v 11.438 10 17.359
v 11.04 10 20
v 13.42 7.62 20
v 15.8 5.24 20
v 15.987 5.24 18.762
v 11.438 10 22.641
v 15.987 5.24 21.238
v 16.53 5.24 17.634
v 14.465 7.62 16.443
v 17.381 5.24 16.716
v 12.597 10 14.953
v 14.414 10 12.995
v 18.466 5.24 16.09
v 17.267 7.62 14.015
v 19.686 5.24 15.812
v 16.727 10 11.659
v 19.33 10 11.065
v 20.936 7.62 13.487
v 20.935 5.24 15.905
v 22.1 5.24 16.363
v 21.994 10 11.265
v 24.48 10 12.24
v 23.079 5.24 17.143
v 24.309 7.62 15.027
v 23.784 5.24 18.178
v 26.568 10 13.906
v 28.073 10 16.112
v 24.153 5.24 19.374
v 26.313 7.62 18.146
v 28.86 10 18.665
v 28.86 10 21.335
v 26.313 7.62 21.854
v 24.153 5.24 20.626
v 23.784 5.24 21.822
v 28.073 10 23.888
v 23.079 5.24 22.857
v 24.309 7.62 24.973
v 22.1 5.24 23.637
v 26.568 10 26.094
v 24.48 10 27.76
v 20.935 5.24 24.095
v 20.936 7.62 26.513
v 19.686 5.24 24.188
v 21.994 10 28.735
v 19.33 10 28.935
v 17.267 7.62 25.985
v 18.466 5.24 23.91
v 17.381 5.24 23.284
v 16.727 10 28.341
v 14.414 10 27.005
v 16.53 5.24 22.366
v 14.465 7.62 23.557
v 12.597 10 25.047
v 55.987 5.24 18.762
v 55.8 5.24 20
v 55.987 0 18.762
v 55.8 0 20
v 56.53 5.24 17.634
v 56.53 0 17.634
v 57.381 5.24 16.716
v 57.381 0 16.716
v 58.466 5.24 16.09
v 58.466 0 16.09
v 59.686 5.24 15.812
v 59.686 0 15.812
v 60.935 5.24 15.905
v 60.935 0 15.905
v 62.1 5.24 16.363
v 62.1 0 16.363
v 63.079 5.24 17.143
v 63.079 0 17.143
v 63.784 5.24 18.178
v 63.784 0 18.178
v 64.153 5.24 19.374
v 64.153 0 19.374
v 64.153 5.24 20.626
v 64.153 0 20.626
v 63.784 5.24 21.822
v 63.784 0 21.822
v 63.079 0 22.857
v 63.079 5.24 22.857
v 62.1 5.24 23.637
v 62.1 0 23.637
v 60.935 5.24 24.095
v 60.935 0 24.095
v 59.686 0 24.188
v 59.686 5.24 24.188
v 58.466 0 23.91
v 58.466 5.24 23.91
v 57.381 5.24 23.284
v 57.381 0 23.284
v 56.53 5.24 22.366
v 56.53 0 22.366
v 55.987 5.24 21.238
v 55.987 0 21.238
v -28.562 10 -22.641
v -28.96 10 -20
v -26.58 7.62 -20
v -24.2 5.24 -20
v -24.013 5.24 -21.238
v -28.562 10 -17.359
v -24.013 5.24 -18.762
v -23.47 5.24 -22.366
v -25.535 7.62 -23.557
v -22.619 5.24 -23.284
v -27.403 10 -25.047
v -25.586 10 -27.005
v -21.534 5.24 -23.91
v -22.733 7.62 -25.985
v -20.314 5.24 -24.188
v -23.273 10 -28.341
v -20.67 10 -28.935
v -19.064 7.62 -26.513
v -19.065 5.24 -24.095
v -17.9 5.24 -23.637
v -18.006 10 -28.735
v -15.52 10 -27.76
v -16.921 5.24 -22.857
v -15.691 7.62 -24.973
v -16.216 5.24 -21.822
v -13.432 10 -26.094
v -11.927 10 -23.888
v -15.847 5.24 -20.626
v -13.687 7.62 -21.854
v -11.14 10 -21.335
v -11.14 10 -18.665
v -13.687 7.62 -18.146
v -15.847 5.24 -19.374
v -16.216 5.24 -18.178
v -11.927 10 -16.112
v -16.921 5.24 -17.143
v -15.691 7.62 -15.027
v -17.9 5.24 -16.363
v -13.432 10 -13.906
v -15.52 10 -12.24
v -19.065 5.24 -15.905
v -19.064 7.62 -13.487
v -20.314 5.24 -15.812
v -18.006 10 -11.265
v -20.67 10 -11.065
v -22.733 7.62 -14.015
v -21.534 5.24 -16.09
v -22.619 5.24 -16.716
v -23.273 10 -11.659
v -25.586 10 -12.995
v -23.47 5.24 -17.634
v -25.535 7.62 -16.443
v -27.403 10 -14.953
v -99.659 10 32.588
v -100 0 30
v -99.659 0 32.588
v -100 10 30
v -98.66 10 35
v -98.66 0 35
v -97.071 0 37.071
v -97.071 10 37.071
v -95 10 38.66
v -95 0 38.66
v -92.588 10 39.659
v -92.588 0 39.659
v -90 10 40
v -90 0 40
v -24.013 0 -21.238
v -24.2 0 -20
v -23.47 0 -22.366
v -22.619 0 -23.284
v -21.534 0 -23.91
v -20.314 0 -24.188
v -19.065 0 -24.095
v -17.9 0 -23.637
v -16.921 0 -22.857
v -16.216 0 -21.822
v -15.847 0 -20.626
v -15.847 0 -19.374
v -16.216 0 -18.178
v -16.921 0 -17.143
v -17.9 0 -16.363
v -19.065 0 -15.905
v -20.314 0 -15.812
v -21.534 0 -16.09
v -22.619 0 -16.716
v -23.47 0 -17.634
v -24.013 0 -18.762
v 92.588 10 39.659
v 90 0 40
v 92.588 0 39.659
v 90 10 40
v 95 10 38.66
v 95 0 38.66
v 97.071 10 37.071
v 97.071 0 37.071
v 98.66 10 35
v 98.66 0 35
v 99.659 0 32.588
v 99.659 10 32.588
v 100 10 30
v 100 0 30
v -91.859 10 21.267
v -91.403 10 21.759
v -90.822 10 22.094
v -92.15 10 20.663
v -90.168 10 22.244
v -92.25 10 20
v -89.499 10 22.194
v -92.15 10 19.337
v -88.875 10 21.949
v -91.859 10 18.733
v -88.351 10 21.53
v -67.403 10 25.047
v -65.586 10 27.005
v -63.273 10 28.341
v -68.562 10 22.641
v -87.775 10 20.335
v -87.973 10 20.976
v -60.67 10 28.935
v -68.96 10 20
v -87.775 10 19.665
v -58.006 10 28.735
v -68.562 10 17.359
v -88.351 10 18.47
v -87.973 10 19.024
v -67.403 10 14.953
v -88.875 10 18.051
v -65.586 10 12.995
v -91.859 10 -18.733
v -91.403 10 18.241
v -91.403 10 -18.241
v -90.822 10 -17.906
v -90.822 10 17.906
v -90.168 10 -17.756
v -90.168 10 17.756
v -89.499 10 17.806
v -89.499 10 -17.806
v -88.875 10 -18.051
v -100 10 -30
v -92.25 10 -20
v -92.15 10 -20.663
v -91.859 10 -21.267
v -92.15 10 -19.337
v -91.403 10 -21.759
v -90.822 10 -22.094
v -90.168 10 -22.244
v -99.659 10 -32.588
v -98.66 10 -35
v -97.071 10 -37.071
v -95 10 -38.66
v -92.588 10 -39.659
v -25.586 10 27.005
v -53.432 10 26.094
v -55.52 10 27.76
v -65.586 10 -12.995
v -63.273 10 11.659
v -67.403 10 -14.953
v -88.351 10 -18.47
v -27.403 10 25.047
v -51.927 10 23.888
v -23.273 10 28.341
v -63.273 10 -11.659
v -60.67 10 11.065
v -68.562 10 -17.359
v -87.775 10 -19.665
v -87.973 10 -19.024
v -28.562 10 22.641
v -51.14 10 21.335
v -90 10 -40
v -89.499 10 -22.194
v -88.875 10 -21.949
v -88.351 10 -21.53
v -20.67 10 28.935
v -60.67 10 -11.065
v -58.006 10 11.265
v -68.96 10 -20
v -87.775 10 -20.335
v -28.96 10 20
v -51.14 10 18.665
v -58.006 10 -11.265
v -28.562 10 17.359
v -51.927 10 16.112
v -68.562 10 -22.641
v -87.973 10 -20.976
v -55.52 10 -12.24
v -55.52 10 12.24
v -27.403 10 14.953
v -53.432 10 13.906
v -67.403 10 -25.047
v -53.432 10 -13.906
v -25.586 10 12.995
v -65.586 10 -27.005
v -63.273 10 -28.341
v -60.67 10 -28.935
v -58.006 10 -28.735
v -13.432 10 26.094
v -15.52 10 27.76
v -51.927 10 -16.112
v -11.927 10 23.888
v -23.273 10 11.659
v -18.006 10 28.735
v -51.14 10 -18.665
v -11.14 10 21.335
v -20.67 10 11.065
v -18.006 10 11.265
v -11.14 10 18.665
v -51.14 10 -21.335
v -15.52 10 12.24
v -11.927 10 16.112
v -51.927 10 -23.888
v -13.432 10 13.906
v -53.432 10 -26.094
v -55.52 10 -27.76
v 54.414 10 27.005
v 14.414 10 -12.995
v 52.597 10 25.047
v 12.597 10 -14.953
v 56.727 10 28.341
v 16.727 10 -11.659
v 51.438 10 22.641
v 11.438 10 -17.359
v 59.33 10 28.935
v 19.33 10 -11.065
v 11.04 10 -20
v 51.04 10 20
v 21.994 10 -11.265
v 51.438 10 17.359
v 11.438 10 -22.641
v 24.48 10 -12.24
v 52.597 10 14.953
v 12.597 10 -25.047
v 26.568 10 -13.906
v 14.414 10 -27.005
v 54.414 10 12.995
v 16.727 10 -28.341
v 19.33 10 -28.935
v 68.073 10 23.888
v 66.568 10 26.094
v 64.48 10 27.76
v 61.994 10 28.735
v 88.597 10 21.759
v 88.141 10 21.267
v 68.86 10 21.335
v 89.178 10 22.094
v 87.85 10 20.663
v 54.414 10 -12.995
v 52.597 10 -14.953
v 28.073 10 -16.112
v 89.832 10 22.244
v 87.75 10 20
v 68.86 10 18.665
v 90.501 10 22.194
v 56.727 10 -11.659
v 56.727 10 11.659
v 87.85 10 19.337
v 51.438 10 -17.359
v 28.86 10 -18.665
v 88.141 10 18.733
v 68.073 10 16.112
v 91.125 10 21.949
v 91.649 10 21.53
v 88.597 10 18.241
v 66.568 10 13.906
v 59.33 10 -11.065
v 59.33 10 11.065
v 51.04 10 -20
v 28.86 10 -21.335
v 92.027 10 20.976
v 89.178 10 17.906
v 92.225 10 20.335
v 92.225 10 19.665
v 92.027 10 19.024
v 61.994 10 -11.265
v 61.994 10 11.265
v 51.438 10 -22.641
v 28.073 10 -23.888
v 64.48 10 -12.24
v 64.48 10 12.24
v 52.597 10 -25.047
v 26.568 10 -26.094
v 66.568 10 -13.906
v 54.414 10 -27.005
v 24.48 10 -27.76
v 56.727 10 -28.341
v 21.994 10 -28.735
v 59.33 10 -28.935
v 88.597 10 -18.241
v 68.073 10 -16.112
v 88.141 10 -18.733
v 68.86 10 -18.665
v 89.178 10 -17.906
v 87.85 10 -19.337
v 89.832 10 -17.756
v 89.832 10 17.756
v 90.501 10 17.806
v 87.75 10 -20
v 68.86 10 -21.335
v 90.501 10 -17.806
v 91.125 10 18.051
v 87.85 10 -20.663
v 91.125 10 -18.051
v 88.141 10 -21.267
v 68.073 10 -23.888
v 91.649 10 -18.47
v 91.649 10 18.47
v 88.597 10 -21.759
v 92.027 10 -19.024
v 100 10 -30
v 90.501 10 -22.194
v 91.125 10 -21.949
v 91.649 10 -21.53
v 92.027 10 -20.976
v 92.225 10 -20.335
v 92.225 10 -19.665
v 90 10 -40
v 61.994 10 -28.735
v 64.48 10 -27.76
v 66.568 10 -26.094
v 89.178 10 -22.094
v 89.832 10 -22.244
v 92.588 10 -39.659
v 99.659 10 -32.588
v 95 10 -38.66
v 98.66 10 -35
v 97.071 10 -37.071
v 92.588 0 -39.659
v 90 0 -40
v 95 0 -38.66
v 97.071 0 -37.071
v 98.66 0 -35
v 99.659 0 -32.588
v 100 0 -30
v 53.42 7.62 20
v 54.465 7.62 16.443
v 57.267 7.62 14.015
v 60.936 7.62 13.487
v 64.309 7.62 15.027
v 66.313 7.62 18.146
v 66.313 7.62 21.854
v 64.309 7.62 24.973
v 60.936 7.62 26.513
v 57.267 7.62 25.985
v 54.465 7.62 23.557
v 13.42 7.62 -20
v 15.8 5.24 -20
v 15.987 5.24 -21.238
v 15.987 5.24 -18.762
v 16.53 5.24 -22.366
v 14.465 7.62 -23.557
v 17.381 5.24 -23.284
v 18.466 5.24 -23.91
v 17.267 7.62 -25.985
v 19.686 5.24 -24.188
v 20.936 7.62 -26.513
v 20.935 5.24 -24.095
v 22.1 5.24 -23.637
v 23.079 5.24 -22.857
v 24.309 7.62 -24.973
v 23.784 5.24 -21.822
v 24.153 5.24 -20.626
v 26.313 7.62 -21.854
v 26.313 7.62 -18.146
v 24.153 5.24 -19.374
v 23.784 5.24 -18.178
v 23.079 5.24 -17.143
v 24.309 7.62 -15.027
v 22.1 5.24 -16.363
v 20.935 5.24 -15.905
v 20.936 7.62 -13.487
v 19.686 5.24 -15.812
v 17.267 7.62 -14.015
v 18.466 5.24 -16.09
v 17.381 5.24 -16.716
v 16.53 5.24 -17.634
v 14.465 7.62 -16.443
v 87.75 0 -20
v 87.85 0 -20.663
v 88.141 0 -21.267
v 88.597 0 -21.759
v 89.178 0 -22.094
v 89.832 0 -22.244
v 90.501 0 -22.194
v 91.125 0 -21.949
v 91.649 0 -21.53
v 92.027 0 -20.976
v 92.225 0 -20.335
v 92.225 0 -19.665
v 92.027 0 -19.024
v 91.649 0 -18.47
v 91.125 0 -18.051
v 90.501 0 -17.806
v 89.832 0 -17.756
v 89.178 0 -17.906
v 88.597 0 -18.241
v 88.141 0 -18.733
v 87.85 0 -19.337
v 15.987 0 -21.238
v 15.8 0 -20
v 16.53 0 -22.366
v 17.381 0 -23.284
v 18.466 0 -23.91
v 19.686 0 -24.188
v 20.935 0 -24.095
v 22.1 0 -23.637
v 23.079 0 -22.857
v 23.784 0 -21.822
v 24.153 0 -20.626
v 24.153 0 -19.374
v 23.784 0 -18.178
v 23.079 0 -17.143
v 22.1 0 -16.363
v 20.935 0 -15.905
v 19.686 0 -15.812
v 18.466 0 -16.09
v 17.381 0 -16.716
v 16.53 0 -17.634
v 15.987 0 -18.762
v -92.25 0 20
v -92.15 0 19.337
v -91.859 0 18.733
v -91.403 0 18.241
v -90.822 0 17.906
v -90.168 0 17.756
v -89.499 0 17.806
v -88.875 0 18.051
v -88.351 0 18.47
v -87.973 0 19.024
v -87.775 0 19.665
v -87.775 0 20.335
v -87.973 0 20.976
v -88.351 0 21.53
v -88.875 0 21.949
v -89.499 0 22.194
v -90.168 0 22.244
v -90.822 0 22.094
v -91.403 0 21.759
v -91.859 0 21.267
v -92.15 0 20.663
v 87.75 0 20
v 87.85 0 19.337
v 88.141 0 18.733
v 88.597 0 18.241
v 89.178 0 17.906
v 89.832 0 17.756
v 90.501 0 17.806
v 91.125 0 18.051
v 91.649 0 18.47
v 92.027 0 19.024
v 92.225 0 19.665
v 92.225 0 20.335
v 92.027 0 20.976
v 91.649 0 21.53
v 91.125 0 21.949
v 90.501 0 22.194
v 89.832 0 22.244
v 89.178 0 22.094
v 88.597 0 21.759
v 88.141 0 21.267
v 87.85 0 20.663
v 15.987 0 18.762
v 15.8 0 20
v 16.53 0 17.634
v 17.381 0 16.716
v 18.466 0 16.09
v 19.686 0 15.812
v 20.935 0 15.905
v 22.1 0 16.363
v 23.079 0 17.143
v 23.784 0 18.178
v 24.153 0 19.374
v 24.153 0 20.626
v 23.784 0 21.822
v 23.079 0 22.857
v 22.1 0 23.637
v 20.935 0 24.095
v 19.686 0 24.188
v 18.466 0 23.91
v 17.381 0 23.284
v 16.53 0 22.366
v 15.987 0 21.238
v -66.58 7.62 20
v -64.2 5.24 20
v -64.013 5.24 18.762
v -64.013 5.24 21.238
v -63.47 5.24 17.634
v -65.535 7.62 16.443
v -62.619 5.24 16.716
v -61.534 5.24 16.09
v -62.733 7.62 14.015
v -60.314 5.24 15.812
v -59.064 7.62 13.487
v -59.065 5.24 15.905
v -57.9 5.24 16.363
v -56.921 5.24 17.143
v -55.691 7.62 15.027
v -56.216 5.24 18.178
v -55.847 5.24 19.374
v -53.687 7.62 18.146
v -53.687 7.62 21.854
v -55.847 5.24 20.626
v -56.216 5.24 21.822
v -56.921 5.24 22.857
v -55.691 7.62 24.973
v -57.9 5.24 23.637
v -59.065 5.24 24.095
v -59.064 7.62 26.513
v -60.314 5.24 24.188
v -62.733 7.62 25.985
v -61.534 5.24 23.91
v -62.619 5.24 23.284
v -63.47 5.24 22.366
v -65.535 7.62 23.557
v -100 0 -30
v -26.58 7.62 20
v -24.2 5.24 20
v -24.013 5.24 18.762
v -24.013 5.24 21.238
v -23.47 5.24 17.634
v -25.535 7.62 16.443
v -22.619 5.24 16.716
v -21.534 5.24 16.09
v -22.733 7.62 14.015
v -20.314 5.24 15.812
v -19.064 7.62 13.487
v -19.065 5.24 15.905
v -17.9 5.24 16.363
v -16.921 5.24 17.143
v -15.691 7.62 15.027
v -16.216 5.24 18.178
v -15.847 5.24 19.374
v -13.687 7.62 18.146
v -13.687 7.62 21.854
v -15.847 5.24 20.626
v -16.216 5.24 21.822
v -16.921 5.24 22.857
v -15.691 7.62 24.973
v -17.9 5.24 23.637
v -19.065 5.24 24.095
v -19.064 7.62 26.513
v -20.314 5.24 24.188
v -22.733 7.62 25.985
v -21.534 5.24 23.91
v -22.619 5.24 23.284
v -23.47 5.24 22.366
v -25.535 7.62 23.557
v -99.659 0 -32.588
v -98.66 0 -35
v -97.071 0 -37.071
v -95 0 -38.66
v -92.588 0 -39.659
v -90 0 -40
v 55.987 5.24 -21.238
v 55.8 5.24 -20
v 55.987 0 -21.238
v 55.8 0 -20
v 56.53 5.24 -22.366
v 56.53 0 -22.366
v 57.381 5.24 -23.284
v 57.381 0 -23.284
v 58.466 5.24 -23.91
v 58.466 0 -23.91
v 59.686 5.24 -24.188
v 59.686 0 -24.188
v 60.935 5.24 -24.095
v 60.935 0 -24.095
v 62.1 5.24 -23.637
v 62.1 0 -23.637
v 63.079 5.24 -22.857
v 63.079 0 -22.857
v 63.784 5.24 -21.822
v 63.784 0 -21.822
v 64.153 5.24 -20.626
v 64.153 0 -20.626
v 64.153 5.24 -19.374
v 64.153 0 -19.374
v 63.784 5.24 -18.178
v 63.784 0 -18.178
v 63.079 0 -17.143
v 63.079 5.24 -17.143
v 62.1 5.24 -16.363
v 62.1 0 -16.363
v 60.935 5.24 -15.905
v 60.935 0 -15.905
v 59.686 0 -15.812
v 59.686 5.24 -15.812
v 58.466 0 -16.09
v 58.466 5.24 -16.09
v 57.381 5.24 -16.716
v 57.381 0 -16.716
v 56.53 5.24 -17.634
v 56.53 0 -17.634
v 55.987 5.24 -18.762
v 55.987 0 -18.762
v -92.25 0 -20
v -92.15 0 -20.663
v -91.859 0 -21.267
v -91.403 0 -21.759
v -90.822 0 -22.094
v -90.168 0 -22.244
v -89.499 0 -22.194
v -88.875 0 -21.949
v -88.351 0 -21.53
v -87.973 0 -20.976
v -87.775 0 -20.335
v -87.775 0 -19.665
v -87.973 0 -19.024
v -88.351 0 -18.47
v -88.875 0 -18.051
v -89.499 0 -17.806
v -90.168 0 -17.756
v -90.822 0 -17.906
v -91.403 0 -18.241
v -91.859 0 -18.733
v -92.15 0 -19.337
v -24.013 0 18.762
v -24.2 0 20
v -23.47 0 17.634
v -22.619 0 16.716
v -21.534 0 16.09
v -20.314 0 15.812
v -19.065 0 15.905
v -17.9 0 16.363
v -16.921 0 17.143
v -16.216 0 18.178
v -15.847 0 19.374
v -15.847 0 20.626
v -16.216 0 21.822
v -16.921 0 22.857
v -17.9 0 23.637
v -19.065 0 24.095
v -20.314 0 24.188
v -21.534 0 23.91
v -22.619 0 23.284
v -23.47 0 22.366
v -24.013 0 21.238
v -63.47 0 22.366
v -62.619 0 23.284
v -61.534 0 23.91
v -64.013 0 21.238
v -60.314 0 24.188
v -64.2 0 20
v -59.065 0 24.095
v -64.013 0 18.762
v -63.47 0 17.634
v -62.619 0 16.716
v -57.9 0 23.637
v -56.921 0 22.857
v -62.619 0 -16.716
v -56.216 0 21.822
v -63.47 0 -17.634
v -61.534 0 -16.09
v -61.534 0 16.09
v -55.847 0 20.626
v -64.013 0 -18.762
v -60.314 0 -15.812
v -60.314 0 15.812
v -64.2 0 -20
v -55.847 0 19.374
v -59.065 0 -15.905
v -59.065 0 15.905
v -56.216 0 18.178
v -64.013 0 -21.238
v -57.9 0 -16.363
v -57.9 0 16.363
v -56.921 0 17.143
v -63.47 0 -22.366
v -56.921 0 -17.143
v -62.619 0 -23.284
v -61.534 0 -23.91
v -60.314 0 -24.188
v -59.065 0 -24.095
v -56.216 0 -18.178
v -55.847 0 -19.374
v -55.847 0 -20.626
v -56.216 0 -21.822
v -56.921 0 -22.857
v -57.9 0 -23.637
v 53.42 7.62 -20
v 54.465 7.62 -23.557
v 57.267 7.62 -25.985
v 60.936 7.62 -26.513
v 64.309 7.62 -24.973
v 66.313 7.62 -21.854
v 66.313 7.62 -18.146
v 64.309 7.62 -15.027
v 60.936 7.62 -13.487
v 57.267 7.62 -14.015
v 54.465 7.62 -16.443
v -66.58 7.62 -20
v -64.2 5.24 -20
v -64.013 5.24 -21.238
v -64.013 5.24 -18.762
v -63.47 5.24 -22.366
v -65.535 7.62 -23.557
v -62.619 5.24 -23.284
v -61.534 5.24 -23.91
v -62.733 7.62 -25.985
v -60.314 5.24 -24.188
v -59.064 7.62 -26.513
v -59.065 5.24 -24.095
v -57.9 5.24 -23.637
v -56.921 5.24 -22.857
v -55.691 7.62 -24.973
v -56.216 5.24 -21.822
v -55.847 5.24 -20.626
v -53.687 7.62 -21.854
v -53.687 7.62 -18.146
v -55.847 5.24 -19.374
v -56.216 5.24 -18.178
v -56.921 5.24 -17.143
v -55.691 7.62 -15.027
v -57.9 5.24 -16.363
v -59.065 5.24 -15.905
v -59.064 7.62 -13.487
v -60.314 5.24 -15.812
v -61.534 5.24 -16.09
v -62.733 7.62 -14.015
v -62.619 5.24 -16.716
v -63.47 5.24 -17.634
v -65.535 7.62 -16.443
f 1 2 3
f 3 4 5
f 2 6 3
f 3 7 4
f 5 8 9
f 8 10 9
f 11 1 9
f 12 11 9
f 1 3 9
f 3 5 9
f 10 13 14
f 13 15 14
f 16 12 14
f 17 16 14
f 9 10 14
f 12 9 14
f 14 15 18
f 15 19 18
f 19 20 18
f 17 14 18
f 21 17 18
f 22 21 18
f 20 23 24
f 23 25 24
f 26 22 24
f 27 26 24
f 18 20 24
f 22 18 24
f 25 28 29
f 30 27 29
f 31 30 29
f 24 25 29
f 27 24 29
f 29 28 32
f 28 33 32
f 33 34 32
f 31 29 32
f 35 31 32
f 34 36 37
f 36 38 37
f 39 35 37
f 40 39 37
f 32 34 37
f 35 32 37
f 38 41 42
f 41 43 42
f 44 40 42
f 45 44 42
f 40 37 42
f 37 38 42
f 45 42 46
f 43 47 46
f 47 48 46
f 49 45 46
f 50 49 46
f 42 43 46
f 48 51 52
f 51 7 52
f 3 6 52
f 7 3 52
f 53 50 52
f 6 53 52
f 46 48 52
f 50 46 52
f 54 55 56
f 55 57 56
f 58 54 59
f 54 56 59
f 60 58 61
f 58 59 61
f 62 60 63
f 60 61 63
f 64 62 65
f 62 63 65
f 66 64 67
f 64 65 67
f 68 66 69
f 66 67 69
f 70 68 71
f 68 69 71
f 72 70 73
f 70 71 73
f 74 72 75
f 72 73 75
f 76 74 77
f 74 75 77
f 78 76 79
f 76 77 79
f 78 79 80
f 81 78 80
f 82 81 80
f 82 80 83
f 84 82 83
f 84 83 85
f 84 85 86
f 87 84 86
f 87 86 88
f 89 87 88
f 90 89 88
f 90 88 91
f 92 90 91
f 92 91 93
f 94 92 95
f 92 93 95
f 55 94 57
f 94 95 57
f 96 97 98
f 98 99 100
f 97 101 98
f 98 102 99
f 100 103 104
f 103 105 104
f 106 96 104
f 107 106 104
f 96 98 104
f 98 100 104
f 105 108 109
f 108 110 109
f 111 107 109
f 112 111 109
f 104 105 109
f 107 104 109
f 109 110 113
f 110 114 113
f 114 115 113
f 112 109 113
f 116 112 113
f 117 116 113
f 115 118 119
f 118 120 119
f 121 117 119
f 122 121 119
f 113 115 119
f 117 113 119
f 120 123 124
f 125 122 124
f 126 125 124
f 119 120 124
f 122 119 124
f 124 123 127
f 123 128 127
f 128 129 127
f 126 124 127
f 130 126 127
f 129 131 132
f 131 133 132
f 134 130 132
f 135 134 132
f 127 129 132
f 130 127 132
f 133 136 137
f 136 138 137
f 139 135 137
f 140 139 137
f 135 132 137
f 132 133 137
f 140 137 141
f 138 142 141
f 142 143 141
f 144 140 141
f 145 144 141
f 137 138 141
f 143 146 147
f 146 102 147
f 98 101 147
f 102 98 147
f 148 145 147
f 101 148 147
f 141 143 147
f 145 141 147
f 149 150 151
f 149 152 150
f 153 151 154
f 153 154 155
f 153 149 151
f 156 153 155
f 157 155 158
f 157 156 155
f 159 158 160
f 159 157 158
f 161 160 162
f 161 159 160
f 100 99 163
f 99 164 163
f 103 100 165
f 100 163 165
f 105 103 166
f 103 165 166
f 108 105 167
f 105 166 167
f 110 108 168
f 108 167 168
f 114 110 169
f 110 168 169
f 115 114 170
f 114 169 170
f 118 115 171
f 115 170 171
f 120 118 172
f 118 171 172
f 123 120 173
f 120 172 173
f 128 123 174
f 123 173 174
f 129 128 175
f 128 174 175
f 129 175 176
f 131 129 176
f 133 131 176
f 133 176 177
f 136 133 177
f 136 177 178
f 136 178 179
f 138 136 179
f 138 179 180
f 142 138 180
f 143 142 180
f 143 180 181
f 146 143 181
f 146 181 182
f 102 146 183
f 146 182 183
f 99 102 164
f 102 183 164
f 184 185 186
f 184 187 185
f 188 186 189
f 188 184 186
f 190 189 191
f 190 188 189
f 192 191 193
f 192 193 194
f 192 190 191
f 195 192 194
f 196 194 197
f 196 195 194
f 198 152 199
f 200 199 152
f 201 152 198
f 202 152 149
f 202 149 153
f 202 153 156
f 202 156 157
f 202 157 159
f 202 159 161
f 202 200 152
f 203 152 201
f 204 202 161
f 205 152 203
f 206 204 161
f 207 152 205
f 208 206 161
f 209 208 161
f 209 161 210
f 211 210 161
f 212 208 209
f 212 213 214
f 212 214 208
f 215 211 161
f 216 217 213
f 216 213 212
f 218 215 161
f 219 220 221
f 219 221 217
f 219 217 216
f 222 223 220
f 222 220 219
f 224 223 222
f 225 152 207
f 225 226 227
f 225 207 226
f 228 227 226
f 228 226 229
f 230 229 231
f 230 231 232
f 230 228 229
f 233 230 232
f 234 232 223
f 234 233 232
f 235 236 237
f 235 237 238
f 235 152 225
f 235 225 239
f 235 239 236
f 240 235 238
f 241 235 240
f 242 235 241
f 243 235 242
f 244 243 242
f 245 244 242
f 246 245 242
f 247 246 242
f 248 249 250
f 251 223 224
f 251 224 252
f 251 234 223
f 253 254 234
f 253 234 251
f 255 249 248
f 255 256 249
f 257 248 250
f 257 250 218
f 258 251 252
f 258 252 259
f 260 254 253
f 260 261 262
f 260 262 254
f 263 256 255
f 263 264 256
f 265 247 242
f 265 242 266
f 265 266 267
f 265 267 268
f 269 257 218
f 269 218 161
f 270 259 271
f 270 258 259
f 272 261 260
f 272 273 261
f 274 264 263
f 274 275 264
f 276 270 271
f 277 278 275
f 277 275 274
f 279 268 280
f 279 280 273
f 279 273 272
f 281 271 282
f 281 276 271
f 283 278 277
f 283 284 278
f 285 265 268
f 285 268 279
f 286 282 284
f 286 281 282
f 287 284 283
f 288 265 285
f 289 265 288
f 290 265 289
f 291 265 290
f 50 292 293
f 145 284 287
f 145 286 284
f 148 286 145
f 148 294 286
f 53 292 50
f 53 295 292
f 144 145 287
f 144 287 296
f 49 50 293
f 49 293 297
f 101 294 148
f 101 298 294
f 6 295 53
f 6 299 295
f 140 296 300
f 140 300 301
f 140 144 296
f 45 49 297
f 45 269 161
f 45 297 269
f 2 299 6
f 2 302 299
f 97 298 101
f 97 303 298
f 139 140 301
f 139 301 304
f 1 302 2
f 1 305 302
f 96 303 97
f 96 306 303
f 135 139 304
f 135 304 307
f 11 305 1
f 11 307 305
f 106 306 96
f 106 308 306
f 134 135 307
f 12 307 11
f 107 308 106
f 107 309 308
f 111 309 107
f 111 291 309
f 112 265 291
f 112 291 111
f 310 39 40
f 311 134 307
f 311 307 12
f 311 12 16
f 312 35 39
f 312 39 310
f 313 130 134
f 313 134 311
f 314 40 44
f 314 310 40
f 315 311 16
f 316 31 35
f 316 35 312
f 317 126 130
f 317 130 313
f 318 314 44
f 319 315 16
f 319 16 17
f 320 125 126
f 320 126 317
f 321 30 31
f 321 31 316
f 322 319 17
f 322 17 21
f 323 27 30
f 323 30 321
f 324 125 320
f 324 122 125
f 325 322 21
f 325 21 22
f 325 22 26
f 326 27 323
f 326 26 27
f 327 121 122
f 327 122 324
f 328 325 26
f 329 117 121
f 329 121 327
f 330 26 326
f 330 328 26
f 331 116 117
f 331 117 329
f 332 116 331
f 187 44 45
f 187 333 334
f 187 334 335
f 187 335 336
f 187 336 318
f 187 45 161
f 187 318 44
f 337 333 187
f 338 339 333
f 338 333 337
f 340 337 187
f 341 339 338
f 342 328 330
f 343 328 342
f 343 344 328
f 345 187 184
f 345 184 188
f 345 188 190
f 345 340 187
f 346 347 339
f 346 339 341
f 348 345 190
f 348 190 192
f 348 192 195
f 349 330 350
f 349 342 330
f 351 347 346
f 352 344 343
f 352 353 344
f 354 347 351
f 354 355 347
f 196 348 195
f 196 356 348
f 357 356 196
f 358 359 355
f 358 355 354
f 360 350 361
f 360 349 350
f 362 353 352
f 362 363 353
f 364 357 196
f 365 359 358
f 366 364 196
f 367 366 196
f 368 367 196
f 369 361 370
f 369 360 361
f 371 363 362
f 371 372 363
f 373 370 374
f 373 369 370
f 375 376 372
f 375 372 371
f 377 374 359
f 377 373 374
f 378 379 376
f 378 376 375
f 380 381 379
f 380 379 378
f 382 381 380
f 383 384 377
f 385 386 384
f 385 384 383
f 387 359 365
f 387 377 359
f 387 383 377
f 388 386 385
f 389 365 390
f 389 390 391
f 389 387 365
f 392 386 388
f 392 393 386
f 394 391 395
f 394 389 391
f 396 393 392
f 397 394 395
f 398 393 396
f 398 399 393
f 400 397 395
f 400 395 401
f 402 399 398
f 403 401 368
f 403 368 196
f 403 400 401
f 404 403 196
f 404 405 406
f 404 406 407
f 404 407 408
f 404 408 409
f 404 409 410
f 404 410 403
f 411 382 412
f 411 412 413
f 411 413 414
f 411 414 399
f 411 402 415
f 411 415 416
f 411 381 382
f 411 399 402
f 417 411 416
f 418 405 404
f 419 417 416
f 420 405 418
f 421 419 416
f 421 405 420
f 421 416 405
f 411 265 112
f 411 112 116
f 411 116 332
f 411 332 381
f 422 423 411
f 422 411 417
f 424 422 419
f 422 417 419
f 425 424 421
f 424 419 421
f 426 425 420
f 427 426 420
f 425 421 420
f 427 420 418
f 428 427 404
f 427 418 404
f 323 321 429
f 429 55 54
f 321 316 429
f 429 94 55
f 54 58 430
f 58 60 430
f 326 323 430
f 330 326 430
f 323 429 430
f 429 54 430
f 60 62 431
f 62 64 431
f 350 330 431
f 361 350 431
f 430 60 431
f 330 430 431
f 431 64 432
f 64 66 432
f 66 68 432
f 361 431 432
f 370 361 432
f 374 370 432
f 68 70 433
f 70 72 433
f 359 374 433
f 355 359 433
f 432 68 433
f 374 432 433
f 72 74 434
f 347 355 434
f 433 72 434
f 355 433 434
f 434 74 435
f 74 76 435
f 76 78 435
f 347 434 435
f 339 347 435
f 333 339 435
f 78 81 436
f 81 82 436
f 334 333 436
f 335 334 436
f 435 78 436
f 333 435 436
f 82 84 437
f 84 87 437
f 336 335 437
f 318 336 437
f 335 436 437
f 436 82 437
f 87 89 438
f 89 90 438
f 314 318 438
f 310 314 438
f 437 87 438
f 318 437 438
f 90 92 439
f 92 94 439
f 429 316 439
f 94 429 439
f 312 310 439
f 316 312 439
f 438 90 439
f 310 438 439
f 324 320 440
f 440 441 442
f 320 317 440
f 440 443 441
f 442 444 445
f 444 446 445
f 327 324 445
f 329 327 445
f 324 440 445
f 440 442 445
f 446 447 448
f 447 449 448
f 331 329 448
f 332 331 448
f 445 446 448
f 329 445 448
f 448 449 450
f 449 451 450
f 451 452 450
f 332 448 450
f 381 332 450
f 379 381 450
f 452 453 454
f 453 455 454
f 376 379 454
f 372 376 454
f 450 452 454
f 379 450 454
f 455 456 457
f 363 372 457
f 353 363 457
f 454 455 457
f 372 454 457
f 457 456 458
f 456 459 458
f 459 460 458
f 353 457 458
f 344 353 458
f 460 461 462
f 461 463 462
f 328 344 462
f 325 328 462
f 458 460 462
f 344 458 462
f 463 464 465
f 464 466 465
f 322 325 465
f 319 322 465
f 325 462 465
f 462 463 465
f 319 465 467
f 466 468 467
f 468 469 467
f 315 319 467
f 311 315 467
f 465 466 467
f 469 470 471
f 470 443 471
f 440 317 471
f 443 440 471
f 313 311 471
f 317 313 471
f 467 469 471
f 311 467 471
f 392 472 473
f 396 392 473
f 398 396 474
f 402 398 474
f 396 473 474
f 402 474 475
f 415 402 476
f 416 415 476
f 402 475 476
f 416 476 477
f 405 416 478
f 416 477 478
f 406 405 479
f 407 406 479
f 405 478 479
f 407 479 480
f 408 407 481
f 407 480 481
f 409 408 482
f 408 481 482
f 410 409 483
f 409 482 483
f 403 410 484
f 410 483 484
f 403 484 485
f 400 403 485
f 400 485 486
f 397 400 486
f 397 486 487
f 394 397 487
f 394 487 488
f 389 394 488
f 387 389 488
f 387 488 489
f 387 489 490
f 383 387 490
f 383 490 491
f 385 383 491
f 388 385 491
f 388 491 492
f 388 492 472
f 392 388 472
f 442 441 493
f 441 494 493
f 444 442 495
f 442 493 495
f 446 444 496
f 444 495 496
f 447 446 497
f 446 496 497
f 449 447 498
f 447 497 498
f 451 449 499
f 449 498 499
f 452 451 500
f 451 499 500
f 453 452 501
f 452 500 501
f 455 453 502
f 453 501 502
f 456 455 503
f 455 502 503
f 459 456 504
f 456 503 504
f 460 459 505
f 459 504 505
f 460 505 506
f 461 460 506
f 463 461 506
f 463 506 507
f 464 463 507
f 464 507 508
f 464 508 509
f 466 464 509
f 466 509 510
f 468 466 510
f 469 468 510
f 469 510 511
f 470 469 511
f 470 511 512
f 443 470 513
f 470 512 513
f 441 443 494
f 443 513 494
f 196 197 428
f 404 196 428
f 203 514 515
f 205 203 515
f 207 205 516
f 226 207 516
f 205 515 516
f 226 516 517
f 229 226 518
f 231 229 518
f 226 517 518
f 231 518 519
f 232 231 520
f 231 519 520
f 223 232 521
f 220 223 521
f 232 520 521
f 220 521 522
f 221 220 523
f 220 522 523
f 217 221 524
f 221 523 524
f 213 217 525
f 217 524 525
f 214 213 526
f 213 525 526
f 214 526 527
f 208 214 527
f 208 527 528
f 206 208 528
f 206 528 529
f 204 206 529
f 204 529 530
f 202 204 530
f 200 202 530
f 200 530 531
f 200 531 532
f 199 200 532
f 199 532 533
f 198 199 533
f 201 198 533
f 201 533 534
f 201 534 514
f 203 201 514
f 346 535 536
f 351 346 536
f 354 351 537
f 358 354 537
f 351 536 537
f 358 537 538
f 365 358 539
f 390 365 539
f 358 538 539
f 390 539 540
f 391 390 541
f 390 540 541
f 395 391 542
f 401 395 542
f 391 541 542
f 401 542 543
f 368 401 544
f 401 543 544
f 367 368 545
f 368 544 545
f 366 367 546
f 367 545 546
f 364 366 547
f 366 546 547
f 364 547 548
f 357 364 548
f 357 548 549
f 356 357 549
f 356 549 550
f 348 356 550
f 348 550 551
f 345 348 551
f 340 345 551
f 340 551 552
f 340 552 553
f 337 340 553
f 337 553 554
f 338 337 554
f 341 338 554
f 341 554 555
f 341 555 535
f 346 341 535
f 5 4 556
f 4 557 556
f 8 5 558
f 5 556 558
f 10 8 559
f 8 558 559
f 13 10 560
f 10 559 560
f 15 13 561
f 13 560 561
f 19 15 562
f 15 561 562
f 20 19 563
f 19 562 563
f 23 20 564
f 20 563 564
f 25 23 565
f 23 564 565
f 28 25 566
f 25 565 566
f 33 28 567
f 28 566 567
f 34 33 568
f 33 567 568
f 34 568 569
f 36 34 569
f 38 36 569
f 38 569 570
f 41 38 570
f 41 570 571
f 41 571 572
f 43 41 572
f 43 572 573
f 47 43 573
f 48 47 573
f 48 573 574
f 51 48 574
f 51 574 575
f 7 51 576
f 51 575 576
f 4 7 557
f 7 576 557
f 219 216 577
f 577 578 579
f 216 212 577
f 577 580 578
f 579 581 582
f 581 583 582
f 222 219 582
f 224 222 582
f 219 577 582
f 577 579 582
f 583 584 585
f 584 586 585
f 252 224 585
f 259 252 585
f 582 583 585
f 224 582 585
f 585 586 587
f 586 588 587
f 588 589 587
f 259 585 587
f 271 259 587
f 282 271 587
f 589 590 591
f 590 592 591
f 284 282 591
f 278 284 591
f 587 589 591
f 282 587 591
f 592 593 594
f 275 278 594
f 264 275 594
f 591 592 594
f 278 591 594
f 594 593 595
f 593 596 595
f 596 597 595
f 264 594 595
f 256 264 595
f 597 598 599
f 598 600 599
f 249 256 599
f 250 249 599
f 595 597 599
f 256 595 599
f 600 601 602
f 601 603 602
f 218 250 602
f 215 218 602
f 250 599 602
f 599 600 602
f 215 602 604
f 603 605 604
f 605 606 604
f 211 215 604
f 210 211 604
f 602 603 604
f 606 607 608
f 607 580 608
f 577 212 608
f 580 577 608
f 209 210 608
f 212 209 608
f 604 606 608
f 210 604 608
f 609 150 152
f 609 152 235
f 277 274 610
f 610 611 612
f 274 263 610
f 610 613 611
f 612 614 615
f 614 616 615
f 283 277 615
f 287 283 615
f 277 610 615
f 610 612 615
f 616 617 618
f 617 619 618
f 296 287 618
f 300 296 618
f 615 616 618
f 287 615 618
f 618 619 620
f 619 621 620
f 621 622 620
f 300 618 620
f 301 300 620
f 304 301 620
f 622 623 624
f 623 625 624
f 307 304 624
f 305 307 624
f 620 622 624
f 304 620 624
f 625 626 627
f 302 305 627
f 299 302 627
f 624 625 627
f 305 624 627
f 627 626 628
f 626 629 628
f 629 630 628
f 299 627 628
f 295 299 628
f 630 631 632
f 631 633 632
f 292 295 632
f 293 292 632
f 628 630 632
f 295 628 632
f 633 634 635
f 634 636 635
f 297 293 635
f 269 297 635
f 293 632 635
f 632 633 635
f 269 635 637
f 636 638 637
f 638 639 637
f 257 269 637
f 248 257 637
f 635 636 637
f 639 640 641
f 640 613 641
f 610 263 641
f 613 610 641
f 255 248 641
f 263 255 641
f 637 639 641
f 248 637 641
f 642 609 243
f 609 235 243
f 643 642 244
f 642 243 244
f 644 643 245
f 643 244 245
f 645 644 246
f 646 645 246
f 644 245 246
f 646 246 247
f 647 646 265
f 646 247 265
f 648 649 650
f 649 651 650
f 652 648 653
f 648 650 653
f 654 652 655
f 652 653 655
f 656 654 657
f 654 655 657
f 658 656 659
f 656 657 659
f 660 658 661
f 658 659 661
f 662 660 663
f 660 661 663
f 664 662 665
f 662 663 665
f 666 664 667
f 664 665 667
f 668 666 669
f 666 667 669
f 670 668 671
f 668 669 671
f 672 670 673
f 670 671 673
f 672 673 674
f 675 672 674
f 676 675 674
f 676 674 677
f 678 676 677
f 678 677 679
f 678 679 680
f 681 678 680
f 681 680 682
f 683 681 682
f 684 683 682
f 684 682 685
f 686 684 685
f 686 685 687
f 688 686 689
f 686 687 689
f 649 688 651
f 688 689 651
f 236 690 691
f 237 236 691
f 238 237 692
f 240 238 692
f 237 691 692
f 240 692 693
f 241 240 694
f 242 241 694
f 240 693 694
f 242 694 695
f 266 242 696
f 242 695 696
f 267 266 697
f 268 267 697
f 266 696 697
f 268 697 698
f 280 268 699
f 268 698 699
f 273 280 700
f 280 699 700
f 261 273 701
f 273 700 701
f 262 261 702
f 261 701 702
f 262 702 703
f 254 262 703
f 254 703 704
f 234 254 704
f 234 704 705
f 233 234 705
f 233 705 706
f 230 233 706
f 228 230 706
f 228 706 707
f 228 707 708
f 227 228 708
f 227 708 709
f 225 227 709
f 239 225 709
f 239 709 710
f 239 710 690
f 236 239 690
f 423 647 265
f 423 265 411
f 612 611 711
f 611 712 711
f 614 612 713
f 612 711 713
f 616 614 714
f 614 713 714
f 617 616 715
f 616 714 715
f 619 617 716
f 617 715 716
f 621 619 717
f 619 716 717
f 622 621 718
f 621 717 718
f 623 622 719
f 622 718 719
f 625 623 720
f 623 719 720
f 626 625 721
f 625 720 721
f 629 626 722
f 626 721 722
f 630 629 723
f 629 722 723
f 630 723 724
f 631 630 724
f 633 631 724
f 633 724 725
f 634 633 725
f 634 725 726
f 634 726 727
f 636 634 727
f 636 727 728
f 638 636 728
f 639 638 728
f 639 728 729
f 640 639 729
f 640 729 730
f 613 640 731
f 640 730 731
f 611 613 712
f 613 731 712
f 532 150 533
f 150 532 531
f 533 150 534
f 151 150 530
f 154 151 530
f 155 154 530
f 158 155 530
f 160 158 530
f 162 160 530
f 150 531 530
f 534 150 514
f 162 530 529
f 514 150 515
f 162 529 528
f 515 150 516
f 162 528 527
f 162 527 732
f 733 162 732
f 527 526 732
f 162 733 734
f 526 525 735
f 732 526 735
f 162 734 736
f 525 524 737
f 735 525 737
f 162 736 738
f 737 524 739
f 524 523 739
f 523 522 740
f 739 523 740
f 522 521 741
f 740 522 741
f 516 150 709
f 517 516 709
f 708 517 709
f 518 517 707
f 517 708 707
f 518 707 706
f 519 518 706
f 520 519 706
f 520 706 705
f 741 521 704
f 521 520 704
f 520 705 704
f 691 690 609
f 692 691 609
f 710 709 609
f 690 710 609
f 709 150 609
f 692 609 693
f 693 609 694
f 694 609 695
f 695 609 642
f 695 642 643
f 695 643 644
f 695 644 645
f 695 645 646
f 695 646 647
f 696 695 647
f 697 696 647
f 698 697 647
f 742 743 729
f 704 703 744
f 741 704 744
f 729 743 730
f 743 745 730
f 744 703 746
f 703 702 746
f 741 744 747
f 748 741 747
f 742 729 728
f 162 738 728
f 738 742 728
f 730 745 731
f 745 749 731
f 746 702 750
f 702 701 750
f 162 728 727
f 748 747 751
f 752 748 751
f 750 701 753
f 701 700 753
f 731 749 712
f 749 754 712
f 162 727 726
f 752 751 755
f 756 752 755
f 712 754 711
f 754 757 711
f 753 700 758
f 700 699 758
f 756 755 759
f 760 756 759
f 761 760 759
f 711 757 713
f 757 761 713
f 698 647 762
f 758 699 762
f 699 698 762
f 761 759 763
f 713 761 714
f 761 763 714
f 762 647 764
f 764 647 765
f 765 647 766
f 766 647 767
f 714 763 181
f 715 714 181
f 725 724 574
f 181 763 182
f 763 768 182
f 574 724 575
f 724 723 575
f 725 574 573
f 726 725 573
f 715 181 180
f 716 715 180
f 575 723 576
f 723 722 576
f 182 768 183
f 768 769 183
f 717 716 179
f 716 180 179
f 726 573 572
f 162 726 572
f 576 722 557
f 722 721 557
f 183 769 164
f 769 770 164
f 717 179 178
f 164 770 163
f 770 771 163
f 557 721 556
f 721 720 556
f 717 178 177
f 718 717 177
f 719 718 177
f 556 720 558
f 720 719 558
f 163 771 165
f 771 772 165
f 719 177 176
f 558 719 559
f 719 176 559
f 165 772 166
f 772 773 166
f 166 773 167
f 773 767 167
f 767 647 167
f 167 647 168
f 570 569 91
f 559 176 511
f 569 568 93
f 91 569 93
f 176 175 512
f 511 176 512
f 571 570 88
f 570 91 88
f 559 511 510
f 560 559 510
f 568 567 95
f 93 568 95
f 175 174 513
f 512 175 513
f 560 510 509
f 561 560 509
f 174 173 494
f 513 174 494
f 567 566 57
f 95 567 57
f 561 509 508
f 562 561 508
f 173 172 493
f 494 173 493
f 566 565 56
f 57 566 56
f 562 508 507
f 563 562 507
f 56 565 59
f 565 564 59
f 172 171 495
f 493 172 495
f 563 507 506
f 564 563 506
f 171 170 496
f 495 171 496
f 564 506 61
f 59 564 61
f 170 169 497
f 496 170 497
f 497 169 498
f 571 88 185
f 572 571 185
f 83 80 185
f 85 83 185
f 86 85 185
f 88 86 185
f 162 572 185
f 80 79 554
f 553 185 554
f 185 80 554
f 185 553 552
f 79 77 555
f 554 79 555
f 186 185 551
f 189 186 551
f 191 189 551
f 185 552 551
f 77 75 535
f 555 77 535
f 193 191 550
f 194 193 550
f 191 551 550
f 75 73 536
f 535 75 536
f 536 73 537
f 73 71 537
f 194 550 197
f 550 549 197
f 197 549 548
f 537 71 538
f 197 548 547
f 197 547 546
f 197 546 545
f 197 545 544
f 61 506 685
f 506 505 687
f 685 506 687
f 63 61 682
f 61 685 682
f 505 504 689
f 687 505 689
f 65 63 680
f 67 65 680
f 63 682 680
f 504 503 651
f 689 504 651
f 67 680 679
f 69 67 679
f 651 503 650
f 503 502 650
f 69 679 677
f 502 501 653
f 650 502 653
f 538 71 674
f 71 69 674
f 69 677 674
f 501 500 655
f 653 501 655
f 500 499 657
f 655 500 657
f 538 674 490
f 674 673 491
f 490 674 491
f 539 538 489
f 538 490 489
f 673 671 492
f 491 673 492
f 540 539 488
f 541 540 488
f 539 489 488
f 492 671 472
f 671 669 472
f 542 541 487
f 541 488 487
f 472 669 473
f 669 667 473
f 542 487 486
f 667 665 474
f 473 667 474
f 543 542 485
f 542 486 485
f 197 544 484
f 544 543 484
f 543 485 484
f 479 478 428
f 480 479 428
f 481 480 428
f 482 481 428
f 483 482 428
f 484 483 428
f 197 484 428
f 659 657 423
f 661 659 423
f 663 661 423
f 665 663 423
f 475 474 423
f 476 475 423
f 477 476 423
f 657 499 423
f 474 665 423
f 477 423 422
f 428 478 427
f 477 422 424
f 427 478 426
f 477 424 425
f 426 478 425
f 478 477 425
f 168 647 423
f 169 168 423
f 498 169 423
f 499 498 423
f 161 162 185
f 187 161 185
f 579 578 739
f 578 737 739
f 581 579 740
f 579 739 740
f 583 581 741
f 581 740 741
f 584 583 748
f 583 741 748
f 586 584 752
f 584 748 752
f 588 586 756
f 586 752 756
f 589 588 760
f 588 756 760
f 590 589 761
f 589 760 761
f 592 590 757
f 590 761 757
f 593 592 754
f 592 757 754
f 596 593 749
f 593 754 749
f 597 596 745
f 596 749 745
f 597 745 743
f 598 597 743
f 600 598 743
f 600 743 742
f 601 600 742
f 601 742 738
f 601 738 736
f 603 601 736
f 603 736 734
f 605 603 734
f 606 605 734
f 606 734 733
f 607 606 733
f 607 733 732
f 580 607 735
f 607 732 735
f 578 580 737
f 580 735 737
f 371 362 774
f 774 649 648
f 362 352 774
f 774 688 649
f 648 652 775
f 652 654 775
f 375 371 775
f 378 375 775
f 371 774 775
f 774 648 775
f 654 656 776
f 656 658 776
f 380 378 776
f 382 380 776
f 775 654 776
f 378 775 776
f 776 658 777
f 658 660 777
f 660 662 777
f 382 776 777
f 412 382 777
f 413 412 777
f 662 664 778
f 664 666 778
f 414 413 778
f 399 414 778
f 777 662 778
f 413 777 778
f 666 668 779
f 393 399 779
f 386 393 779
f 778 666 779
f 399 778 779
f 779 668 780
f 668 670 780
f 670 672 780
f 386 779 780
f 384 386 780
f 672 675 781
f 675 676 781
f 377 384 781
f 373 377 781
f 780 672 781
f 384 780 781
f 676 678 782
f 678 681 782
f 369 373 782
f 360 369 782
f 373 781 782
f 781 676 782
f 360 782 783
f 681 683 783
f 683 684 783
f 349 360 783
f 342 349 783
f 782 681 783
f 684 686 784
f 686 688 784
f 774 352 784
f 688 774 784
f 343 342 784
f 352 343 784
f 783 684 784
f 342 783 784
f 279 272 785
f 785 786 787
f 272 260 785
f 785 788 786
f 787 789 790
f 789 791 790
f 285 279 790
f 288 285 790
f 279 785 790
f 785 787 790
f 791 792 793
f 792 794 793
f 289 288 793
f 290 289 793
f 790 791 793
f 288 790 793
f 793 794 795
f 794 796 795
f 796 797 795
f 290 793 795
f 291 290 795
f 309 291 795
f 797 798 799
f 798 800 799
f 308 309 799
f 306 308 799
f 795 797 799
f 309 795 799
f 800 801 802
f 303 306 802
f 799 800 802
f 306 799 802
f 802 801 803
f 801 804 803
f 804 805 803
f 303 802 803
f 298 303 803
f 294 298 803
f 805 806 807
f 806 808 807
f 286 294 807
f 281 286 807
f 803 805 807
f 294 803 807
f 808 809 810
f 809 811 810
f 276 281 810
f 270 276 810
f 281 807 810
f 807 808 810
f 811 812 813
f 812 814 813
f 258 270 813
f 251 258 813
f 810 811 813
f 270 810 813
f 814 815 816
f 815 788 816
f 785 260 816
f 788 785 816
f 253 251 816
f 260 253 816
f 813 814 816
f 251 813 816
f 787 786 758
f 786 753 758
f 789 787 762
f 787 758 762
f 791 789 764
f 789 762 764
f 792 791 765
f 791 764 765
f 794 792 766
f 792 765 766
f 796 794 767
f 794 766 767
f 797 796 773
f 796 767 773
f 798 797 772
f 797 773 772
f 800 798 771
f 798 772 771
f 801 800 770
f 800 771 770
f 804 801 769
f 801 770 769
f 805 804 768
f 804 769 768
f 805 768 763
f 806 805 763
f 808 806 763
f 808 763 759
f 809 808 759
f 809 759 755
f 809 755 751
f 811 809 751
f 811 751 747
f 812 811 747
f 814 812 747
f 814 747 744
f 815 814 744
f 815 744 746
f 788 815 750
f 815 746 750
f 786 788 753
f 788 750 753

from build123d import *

# Parameters (mm, degrees)
SKETCH1_W                     = 200
SKETCH1_H                     = 80
BOSS_EXTRUDE1_DEPTH           = 10
CSK_FOR_M8_SFHCS1_D           = 8.4
CSK_FOR_M8_SFHCS1_CSINK_D     = 17.92
CSK_FOR_M8_SFHCS1_CSINK_ANGLE = 90
M4_CLEARANCE_HOLE1_D          = 4.5
FILLET1_R                     = 10


with BuildPart() as part:
    # Sketch1 → Boss-Extrude1 (new body)
    with BuildSketch(Plane(origin=(0, 0, 0), x_dir=(1, 0, 0), z_dir=(0, 1, 0))):
        Rectangle(SKETCH1_W, SKETCH1_H)
    extrude(amount=BOSS_EXTRUDE1_DEPTH)

    # CSK for M8 SFHCS1 (through all)
    with Locations(Plane(origin=(0, 10, 0), x_dir=(1, 0, 0), z_dir=(0, 1, 0))):
        with Locations((-20, 20), (20, -20), (60, -20), (-20, -20), (-60, -20), (60, 20), (20, 20), (-60, 20)):
            CounterSinkHole(CSK_FOR_M8_SFHCS1_D / 2, CSK_FOR_M8_SFHCS1_CSINK_D / 2, counter_sink_angle=CSK_FOR_M8_SFHCS1_CSINK_ANGLE)

    # M4 Clearance Hole1 (through all)
    with Locations(Plane(origin=(0, 10, 0), x_dir=(1, 0, 0), z_dir=(0, 1, 0))):
        with Locations((-90, 20), (90, 20), (90, -20), (-90, -20)):
            Hole(M4_CLEARANCE_HOLE1_D / 2)

    # Fillet1
    fillet1_edges = [part.edges().sort_by_distance(p)[0] for p in [
        (100, 5, 40),
        (-100, 5, 40),
        (-100, 5, -40),
        (100, 5, -40),
    ]]
    fillet(fillet1_edges, radius=FILLET1_R)


solid = part.part
